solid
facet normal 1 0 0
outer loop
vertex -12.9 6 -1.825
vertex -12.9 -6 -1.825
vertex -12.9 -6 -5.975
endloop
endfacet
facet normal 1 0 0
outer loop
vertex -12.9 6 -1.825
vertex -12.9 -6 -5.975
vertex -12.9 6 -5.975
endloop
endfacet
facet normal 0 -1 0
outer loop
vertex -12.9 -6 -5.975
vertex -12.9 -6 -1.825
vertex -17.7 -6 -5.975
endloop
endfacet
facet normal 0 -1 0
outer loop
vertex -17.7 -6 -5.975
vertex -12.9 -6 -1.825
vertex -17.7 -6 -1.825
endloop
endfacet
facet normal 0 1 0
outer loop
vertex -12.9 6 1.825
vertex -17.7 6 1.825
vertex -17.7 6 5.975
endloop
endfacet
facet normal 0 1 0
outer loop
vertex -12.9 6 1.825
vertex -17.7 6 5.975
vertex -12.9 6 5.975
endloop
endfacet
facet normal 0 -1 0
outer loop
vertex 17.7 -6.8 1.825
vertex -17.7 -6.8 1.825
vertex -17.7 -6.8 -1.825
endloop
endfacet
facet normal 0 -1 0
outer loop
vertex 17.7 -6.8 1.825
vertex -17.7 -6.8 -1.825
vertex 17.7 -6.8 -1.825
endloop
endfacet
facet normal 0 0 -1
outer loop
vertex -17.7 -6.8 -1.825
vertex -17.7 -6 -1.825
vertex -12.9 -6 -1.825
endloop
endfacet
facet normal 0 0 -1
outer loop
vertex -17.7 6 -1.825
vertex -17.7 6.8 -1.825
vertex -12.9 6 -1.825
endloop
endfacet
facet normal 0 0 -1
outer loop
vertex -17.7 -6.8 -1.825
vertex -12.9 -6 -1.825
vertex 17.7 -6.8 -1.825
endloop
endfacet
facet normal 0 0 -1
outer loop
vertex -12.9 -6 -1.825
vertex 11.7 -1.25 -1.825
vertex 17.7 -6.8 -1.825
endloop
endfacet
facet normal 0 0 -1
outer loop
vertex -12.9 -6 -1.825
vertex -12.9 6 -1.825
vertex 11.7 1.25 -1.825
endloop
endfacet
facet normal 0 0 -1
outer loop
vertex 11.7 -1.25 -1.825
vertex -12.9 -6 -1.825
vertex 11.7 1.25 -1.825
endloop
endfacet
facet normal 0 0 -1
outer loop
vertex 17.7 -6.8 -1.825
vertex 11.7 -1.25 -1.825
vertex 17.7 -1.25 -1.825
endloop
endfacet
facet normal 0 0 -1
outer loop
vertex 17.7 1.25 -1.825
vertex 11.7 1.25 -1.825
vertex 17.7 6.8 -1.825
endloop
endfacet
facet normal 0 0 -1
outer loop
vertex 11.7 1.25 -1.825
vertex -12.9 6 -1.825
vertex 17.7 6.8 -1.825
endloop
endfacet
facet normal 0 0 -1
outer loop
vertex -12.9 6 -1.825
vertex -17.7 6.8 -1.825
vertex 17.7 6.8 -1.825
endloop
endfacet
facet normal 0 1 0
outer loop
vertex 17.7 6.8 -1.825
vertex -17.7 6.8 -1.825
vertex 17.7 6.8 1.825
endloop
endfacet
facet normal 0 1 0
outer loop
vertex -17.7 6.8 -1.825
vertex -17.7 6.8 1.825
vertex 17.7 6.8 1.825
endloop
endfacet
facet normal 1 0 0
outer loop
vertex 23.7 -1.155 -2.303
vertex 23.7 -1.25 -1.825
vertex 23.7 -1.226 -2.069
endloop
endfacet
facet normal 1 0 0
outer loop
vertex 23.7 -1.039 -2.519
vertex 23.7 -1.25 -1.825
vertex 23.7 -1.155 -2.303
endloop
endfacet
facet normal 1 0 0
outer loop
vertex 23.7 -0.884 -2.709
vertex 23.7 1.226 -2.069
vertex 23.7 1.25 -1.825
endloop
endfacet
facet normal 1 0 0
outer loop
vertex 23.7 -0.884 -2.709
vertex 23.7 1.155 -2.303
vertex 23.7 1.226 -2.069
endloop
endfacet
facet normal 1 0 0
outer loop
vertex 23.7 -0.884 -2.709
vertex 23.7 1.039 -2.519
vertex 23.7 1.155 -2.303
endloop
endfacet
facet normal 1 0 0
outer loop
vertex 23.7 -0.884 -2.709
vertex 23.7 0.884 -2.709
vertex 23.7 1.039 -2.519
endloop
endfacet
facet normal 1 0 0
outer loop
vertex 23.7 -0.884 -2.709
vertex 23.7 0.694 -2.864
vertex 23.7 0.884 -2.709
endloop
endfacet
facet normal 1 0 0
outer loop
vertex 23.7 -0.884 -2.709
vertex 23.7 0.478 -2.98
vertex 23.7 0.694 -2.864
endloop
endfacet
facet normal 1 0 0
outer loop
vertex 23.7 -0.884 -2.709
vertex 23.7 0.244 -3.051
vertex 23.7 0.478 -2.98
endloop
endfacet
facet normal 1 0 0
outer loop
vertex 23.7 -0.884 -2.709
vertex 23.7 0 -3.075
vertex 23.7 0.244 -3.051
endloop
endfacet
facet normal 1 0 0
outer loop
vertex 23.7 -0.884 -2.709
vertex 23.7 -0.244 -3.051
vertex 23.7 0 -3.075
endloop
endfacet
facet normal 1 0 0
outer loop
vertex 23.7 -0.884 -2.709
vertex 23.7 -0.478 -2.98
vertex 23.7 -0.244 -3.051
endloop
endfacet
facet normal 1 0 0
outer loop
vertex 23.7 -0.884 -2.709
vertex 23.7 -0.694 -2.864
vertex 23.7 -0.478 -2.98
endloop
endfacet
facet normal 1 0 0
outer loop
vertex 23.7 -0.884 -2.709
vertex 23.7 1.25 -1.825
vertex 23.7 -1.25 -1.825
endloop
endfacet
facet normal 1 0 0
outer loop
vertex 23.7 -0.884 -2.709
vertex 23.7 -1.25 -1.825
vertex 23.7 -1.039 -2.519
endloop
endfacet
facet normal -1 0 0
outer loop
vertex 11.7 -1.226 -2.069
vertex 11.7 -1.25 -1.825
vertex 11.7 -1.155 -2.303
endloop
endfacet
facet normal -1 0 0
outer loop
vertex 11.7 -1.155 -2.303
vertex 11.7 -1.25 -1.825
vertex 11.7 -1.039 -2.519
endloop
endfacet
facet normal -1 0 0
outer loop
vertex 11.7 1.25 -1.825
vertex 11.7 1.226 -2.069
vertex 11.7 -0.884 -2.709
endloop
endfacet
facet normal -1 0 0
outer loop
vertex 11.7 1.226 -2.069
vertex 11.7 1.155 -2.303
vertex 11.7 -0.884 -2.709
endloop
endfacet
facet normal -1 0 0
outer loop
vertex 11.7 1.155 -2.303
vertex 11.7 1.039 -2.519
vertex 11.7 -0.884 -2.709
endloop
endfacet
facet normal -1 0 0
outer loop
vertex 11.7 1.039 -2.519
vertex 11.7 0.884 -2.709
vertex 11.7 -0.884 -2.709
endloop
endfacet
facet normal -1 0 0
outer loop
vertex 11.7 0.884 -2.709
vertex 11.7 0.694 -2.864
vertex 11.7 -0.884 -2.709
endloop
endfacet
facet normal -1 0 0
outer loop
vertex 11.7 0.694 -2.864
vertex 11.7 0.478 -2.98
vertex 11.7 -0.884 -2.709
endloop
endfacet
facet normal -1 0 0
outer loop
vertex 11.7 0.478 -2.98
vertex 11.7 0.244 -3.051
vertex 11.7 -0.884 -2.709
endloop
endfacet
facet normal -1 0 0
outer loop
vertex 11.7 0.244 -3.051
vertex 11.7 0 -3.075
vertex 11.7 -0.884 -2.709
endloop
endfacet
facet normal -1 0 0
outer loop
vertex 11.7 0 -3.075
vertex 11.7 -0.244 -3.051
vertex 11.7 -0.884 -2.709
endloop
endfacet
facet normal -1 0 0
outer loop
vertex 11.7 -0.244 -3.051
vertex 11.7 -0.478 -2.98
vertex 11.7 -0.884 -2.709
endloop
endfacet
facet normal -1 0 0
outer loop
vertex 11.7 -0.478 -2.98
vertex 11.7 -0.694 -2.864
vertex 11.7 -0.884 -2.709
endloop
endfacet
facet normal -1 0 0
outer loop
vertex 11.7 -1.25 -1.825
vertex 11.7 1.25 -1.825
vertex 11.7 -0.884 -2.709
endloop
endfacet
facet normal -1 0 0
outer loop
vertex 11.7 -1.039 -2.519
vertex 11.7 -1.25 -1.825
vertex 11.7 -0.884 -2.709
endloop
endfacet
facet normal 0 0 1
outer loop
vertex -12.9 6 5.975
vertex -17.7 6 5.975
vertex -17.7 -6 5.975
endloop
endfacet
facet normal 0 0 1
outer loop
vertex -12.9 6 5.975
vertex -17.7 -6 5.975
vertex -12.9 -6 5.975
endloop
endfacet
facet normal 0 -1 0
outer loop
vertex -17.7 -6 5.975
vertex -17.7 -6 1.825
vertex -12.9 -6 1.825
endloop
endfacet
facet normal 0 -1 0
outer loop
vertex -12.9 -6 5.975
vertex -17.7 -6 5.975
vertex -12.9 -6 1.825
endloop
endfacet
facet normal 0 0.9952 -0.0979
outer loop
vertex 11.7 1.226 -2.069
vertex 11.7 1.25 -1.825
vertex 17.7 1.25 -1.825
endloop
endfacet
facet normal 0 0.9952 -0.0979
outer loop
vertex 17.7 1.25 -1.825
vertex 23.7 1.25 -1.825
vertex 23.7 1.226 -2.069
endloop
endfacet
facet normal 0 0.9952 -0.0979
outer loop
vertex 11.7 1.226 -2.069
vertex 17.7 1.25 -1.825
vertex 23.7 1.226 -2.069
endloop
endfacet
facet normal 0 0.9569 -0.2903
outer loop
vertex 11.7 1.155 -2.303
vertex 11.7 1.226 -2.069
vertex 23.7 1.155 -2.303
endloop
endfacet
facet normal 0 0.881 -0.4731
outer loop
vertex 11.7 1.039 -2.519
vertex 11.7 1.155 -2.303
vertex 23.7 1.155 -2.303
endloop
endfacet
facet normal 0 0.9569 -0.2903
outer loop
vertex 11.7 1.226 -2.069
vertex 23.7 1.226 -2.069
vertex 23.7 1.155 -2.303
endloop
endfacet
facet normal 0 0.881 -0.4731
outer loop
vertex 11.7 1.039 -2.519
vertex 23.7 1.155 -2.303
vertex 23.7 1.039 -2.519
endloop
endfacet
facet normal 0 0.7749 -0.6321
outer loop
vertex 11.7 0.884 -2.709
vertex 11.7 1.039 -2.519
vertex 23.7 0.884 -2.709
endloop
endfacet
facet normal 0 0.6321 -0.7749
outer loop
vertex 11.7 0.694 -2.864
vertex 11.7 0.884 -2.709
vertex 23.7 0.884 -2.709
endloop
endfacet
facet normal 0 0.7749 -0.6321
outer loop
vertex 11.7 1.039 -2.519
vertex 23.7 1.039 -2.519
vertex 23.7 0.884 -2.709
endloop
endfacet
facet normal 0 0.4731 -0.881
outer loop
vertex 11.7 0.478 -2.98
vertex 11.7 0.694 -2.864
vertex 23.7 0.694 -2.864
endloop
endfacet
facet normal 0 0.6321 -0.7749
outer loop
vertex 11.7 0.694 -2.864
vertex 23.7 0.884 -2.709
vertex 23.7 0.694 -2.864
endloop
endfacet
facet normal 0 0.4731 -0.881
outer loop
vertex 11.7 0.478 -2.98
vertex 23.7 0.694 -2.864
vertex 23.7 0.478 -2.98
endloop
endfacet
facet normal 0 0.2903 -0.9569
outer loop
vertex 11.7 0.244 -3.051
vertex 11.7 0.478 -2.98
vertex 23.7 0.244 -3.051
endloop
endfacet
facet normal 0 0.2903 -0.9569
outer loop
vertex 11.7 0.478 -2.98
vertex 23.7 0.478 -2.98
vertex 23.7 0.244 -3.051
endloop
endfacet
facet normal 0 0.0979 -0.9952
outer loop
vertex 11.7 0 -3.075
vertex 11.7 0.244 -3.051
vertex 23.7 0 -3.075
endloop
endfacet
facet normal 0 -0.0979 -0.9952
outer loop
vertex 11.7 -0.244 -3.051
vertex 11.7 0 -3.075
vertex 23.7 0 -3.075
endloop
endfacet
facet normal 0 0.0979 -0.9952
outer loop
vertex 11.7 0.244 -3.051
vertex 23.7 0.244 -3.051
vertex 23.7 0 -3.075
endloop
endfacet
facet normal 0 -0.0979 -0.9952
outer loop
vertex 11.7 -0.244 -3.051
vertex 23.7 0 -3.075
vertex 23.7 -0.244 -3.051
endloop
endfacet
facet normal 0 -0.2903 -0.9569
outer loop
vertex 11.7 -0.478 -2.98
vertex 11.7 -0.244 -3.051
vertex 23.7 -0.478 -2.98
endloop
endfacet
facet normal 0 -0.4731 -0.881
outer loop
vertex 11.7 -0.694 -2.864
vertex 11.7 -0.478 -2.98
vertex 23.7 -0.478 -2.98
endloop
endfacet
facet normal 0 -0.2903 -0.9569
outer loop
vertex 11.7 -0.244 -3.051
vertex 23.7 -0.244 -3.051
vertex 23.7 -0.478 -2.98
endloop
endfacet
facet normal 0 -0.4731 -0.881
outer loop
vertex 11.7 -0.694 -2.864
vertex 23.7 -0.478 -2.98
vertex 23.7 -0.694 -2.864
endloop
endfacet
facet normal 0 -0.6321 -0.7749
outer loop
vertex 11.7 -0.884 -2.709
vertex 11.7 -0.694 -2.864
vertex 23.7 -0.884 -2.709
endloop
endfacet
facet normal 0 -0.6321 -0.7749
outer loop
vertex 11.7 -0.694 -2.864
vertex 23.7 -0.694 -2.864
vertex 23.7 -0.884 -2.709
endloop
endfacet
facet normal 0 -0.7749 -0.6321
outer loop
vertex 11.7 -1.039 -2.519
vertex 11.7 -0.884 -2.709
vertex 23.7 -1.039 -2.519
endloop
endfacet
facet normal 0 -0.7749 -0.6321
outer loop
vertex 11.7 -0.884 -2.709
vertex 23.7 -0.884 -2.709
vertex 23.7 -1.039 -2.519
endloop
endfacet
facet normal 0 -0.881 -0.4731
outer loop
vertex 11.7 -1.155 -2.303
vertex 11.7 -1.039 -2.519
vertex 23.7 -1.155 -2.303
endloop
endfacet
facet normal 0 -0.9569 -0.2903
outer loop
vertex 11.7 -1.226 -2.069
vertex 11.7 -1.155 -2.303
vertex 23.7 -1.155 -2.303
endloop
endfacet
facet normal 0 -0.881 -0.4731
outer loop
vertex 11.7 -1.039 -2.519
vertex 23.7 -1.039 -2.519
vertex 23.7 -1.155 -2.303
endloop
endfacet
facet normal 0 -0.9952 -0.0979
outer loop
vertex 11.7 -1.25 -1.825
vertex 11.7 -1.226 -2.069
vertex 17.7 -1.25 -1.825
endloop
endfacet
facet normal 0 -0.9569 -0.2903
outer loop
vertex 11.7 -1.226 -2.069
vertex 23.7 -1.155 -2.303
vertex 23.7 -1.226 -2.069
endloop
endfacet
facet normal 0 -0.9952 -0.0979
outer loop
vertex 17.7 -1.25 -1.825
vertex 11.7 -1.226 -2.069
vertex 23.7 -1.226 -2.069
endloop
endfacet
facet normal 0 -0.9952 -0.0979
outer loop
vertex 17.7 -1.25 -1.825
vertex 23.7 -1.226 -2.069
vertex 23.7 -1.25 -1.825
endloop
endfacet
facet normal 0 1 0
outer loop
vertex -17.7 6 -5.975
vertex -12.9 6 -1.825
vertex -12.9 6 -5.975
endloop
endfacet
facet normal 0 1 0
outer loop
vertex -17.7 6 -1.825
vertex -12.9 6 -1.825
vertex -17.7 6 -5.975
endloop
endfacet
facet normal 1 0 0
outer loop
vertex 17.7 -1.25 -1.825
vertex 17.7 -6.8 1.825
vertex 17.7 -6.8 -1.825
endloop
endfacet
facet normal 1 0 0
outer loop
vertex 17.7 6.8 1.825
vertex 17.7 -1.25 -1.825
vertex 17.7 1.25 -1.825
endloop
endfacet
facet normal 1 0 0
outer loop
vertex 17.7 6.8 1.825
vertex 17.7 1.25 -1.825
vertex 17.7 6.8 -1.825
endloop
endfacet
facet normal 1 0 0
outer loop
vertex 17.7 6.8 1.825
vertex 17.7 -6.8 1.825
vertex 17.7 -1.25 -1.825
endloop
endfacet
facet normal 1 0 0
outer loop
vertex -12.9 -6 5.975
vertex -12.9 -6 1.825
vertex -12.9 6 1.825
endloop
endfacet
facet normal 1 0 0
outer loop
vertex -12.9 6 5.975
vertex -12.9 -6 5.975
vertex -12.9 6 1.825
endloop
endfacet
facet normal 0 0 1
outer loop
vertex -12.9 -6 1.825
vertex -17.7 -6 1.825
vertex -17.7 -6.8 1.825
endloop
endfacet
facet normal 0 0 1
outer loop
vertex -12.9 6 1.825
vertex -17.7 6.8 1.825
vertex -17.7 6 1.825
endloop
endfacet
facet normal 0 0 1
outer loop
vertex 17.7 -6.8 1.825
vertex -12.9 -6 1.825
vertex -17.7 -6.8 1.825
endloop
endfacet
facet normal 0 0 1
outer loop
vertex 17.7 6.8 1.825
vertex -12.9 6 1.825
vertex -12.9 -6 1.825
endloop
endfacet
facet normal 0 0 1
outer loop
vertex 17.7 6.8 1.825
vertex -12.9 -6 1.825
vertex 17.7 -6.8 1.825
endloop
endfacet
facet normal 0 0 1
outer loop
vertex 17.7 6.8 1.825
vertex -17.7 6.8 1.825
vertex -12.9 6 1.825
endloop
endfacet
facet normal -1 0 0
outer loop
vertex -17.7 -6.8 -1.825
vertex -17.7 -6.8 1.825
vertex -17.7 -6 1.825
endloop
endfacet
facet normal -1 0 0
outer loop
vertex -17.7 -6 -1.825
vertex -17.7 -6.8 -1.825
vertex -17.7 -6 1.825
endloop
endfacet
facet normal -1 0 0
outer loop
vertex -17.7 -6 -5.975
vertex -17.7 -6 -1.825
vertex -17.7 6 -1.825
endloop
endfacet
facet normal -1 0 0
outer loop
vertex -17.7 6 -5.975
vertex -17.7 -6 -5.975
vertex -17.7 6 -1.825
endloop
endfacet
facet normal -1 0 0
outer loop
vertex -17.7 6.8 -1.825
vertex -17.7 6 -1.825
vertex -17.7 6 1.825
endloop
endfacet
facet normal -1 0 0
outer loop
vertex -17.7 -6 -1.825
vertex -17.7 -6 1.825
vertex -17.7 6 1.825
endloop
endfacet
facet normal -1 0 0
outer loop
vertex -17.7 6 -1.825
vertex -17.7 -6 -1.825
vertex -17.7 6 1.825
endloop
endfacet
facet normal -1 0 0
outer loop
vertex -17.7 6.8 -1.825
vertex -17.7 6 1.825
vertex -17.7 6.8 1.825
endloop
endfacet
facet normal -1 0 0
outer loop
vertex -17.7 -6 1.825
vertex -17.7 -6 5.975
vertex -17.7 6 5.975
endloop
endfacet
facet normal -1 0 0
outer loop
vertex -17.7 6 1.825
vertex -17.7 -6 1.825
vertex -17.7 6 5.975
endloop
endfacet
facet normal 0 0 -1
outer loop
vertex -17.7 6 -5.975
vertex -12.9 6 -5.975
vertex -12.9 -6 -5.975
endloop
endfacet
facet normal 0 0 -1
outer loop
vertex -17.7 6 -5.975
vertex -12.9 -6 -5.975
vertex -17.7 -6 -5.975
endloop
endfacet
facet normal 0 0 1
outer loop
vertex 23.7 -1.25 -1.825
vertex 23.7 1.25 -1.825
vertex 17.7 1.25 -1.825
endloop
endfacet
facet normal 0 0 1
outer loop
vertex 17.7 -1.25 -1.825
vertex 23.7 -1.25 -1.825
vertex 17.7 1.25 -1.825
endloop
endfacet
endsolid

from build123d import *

# Parameters (mm, degrees)
SKETCH1_W           = 35.4
SKETCH1_H           = 13.6
BOSS_EXTRUDE1_DEPTH = 1.825
SKETCH2_W           = 4.8
SKETCH2_H           = 12
BOSS_EXTRUDE2_DEPTH = 4.15
SKETCH3_W           = 4.8
SKETCH3_H           = 12
BOSS_EXTRUDE3_DEPTH = 4.15
SKETCH4_W           = 6
SKETCH4_H           = 1.25
REVOLVE1_ANGLE      = 180


with BuildPart() as part:
    # Sketch1 → Boss-Extrude1 (new, symmetric)
    with BuildSketch(Plane.XY):
        Rectangle(SKETCH1_W, SKETCH1_H)
    extrude(amount=BOSS_EXTRUDE1_DEPTH, both=True)

    # Sketch2 → Boss-Extrude2 (add)
    with BuildSketch(Plane.XY.offset(1.825)):
        with Locations((-15.3, 0)):
            Rectangle(SKETCH2_W, SKETCH2_H)
    extrude(amount=BOSS_EXTRUDE2_DEPTH)

    # Sketch3 → Boss-Extrude3 (add)
    with BuildSketch(Plane(origin=(0, 0, -1.825), x_dir=(-1, 0, 0), z_dir=(0, 0, -1))):
        with Locations((15.3, 0)):
            Rectangle(SKETCH3_W, SKETCH3_H)
    extrude(amount=BOSS_EXTRUDE3_DEPTH)

    # Sketch4 → Revolve1 (revolve)
    with BuildSketch(Plane(origin=(0, 0, -1.825), x_dir=(-1, 0, 0), z_dir=(0, 0, -1))):
        with Locations((-20.7, 0.625)):
            Rectangle(SKETCH4_W, SKETCH4_H)
        with Locations((-14.7, 0.625)):
            Rectangle(SKETCH4_W, SKETCH4_H)
    revolve(axis=Axis((11.7, 0, -1.825), (-1, 0, 0)), revolution_arc=REVOLVE1_ANGLE)


solid = part.part
